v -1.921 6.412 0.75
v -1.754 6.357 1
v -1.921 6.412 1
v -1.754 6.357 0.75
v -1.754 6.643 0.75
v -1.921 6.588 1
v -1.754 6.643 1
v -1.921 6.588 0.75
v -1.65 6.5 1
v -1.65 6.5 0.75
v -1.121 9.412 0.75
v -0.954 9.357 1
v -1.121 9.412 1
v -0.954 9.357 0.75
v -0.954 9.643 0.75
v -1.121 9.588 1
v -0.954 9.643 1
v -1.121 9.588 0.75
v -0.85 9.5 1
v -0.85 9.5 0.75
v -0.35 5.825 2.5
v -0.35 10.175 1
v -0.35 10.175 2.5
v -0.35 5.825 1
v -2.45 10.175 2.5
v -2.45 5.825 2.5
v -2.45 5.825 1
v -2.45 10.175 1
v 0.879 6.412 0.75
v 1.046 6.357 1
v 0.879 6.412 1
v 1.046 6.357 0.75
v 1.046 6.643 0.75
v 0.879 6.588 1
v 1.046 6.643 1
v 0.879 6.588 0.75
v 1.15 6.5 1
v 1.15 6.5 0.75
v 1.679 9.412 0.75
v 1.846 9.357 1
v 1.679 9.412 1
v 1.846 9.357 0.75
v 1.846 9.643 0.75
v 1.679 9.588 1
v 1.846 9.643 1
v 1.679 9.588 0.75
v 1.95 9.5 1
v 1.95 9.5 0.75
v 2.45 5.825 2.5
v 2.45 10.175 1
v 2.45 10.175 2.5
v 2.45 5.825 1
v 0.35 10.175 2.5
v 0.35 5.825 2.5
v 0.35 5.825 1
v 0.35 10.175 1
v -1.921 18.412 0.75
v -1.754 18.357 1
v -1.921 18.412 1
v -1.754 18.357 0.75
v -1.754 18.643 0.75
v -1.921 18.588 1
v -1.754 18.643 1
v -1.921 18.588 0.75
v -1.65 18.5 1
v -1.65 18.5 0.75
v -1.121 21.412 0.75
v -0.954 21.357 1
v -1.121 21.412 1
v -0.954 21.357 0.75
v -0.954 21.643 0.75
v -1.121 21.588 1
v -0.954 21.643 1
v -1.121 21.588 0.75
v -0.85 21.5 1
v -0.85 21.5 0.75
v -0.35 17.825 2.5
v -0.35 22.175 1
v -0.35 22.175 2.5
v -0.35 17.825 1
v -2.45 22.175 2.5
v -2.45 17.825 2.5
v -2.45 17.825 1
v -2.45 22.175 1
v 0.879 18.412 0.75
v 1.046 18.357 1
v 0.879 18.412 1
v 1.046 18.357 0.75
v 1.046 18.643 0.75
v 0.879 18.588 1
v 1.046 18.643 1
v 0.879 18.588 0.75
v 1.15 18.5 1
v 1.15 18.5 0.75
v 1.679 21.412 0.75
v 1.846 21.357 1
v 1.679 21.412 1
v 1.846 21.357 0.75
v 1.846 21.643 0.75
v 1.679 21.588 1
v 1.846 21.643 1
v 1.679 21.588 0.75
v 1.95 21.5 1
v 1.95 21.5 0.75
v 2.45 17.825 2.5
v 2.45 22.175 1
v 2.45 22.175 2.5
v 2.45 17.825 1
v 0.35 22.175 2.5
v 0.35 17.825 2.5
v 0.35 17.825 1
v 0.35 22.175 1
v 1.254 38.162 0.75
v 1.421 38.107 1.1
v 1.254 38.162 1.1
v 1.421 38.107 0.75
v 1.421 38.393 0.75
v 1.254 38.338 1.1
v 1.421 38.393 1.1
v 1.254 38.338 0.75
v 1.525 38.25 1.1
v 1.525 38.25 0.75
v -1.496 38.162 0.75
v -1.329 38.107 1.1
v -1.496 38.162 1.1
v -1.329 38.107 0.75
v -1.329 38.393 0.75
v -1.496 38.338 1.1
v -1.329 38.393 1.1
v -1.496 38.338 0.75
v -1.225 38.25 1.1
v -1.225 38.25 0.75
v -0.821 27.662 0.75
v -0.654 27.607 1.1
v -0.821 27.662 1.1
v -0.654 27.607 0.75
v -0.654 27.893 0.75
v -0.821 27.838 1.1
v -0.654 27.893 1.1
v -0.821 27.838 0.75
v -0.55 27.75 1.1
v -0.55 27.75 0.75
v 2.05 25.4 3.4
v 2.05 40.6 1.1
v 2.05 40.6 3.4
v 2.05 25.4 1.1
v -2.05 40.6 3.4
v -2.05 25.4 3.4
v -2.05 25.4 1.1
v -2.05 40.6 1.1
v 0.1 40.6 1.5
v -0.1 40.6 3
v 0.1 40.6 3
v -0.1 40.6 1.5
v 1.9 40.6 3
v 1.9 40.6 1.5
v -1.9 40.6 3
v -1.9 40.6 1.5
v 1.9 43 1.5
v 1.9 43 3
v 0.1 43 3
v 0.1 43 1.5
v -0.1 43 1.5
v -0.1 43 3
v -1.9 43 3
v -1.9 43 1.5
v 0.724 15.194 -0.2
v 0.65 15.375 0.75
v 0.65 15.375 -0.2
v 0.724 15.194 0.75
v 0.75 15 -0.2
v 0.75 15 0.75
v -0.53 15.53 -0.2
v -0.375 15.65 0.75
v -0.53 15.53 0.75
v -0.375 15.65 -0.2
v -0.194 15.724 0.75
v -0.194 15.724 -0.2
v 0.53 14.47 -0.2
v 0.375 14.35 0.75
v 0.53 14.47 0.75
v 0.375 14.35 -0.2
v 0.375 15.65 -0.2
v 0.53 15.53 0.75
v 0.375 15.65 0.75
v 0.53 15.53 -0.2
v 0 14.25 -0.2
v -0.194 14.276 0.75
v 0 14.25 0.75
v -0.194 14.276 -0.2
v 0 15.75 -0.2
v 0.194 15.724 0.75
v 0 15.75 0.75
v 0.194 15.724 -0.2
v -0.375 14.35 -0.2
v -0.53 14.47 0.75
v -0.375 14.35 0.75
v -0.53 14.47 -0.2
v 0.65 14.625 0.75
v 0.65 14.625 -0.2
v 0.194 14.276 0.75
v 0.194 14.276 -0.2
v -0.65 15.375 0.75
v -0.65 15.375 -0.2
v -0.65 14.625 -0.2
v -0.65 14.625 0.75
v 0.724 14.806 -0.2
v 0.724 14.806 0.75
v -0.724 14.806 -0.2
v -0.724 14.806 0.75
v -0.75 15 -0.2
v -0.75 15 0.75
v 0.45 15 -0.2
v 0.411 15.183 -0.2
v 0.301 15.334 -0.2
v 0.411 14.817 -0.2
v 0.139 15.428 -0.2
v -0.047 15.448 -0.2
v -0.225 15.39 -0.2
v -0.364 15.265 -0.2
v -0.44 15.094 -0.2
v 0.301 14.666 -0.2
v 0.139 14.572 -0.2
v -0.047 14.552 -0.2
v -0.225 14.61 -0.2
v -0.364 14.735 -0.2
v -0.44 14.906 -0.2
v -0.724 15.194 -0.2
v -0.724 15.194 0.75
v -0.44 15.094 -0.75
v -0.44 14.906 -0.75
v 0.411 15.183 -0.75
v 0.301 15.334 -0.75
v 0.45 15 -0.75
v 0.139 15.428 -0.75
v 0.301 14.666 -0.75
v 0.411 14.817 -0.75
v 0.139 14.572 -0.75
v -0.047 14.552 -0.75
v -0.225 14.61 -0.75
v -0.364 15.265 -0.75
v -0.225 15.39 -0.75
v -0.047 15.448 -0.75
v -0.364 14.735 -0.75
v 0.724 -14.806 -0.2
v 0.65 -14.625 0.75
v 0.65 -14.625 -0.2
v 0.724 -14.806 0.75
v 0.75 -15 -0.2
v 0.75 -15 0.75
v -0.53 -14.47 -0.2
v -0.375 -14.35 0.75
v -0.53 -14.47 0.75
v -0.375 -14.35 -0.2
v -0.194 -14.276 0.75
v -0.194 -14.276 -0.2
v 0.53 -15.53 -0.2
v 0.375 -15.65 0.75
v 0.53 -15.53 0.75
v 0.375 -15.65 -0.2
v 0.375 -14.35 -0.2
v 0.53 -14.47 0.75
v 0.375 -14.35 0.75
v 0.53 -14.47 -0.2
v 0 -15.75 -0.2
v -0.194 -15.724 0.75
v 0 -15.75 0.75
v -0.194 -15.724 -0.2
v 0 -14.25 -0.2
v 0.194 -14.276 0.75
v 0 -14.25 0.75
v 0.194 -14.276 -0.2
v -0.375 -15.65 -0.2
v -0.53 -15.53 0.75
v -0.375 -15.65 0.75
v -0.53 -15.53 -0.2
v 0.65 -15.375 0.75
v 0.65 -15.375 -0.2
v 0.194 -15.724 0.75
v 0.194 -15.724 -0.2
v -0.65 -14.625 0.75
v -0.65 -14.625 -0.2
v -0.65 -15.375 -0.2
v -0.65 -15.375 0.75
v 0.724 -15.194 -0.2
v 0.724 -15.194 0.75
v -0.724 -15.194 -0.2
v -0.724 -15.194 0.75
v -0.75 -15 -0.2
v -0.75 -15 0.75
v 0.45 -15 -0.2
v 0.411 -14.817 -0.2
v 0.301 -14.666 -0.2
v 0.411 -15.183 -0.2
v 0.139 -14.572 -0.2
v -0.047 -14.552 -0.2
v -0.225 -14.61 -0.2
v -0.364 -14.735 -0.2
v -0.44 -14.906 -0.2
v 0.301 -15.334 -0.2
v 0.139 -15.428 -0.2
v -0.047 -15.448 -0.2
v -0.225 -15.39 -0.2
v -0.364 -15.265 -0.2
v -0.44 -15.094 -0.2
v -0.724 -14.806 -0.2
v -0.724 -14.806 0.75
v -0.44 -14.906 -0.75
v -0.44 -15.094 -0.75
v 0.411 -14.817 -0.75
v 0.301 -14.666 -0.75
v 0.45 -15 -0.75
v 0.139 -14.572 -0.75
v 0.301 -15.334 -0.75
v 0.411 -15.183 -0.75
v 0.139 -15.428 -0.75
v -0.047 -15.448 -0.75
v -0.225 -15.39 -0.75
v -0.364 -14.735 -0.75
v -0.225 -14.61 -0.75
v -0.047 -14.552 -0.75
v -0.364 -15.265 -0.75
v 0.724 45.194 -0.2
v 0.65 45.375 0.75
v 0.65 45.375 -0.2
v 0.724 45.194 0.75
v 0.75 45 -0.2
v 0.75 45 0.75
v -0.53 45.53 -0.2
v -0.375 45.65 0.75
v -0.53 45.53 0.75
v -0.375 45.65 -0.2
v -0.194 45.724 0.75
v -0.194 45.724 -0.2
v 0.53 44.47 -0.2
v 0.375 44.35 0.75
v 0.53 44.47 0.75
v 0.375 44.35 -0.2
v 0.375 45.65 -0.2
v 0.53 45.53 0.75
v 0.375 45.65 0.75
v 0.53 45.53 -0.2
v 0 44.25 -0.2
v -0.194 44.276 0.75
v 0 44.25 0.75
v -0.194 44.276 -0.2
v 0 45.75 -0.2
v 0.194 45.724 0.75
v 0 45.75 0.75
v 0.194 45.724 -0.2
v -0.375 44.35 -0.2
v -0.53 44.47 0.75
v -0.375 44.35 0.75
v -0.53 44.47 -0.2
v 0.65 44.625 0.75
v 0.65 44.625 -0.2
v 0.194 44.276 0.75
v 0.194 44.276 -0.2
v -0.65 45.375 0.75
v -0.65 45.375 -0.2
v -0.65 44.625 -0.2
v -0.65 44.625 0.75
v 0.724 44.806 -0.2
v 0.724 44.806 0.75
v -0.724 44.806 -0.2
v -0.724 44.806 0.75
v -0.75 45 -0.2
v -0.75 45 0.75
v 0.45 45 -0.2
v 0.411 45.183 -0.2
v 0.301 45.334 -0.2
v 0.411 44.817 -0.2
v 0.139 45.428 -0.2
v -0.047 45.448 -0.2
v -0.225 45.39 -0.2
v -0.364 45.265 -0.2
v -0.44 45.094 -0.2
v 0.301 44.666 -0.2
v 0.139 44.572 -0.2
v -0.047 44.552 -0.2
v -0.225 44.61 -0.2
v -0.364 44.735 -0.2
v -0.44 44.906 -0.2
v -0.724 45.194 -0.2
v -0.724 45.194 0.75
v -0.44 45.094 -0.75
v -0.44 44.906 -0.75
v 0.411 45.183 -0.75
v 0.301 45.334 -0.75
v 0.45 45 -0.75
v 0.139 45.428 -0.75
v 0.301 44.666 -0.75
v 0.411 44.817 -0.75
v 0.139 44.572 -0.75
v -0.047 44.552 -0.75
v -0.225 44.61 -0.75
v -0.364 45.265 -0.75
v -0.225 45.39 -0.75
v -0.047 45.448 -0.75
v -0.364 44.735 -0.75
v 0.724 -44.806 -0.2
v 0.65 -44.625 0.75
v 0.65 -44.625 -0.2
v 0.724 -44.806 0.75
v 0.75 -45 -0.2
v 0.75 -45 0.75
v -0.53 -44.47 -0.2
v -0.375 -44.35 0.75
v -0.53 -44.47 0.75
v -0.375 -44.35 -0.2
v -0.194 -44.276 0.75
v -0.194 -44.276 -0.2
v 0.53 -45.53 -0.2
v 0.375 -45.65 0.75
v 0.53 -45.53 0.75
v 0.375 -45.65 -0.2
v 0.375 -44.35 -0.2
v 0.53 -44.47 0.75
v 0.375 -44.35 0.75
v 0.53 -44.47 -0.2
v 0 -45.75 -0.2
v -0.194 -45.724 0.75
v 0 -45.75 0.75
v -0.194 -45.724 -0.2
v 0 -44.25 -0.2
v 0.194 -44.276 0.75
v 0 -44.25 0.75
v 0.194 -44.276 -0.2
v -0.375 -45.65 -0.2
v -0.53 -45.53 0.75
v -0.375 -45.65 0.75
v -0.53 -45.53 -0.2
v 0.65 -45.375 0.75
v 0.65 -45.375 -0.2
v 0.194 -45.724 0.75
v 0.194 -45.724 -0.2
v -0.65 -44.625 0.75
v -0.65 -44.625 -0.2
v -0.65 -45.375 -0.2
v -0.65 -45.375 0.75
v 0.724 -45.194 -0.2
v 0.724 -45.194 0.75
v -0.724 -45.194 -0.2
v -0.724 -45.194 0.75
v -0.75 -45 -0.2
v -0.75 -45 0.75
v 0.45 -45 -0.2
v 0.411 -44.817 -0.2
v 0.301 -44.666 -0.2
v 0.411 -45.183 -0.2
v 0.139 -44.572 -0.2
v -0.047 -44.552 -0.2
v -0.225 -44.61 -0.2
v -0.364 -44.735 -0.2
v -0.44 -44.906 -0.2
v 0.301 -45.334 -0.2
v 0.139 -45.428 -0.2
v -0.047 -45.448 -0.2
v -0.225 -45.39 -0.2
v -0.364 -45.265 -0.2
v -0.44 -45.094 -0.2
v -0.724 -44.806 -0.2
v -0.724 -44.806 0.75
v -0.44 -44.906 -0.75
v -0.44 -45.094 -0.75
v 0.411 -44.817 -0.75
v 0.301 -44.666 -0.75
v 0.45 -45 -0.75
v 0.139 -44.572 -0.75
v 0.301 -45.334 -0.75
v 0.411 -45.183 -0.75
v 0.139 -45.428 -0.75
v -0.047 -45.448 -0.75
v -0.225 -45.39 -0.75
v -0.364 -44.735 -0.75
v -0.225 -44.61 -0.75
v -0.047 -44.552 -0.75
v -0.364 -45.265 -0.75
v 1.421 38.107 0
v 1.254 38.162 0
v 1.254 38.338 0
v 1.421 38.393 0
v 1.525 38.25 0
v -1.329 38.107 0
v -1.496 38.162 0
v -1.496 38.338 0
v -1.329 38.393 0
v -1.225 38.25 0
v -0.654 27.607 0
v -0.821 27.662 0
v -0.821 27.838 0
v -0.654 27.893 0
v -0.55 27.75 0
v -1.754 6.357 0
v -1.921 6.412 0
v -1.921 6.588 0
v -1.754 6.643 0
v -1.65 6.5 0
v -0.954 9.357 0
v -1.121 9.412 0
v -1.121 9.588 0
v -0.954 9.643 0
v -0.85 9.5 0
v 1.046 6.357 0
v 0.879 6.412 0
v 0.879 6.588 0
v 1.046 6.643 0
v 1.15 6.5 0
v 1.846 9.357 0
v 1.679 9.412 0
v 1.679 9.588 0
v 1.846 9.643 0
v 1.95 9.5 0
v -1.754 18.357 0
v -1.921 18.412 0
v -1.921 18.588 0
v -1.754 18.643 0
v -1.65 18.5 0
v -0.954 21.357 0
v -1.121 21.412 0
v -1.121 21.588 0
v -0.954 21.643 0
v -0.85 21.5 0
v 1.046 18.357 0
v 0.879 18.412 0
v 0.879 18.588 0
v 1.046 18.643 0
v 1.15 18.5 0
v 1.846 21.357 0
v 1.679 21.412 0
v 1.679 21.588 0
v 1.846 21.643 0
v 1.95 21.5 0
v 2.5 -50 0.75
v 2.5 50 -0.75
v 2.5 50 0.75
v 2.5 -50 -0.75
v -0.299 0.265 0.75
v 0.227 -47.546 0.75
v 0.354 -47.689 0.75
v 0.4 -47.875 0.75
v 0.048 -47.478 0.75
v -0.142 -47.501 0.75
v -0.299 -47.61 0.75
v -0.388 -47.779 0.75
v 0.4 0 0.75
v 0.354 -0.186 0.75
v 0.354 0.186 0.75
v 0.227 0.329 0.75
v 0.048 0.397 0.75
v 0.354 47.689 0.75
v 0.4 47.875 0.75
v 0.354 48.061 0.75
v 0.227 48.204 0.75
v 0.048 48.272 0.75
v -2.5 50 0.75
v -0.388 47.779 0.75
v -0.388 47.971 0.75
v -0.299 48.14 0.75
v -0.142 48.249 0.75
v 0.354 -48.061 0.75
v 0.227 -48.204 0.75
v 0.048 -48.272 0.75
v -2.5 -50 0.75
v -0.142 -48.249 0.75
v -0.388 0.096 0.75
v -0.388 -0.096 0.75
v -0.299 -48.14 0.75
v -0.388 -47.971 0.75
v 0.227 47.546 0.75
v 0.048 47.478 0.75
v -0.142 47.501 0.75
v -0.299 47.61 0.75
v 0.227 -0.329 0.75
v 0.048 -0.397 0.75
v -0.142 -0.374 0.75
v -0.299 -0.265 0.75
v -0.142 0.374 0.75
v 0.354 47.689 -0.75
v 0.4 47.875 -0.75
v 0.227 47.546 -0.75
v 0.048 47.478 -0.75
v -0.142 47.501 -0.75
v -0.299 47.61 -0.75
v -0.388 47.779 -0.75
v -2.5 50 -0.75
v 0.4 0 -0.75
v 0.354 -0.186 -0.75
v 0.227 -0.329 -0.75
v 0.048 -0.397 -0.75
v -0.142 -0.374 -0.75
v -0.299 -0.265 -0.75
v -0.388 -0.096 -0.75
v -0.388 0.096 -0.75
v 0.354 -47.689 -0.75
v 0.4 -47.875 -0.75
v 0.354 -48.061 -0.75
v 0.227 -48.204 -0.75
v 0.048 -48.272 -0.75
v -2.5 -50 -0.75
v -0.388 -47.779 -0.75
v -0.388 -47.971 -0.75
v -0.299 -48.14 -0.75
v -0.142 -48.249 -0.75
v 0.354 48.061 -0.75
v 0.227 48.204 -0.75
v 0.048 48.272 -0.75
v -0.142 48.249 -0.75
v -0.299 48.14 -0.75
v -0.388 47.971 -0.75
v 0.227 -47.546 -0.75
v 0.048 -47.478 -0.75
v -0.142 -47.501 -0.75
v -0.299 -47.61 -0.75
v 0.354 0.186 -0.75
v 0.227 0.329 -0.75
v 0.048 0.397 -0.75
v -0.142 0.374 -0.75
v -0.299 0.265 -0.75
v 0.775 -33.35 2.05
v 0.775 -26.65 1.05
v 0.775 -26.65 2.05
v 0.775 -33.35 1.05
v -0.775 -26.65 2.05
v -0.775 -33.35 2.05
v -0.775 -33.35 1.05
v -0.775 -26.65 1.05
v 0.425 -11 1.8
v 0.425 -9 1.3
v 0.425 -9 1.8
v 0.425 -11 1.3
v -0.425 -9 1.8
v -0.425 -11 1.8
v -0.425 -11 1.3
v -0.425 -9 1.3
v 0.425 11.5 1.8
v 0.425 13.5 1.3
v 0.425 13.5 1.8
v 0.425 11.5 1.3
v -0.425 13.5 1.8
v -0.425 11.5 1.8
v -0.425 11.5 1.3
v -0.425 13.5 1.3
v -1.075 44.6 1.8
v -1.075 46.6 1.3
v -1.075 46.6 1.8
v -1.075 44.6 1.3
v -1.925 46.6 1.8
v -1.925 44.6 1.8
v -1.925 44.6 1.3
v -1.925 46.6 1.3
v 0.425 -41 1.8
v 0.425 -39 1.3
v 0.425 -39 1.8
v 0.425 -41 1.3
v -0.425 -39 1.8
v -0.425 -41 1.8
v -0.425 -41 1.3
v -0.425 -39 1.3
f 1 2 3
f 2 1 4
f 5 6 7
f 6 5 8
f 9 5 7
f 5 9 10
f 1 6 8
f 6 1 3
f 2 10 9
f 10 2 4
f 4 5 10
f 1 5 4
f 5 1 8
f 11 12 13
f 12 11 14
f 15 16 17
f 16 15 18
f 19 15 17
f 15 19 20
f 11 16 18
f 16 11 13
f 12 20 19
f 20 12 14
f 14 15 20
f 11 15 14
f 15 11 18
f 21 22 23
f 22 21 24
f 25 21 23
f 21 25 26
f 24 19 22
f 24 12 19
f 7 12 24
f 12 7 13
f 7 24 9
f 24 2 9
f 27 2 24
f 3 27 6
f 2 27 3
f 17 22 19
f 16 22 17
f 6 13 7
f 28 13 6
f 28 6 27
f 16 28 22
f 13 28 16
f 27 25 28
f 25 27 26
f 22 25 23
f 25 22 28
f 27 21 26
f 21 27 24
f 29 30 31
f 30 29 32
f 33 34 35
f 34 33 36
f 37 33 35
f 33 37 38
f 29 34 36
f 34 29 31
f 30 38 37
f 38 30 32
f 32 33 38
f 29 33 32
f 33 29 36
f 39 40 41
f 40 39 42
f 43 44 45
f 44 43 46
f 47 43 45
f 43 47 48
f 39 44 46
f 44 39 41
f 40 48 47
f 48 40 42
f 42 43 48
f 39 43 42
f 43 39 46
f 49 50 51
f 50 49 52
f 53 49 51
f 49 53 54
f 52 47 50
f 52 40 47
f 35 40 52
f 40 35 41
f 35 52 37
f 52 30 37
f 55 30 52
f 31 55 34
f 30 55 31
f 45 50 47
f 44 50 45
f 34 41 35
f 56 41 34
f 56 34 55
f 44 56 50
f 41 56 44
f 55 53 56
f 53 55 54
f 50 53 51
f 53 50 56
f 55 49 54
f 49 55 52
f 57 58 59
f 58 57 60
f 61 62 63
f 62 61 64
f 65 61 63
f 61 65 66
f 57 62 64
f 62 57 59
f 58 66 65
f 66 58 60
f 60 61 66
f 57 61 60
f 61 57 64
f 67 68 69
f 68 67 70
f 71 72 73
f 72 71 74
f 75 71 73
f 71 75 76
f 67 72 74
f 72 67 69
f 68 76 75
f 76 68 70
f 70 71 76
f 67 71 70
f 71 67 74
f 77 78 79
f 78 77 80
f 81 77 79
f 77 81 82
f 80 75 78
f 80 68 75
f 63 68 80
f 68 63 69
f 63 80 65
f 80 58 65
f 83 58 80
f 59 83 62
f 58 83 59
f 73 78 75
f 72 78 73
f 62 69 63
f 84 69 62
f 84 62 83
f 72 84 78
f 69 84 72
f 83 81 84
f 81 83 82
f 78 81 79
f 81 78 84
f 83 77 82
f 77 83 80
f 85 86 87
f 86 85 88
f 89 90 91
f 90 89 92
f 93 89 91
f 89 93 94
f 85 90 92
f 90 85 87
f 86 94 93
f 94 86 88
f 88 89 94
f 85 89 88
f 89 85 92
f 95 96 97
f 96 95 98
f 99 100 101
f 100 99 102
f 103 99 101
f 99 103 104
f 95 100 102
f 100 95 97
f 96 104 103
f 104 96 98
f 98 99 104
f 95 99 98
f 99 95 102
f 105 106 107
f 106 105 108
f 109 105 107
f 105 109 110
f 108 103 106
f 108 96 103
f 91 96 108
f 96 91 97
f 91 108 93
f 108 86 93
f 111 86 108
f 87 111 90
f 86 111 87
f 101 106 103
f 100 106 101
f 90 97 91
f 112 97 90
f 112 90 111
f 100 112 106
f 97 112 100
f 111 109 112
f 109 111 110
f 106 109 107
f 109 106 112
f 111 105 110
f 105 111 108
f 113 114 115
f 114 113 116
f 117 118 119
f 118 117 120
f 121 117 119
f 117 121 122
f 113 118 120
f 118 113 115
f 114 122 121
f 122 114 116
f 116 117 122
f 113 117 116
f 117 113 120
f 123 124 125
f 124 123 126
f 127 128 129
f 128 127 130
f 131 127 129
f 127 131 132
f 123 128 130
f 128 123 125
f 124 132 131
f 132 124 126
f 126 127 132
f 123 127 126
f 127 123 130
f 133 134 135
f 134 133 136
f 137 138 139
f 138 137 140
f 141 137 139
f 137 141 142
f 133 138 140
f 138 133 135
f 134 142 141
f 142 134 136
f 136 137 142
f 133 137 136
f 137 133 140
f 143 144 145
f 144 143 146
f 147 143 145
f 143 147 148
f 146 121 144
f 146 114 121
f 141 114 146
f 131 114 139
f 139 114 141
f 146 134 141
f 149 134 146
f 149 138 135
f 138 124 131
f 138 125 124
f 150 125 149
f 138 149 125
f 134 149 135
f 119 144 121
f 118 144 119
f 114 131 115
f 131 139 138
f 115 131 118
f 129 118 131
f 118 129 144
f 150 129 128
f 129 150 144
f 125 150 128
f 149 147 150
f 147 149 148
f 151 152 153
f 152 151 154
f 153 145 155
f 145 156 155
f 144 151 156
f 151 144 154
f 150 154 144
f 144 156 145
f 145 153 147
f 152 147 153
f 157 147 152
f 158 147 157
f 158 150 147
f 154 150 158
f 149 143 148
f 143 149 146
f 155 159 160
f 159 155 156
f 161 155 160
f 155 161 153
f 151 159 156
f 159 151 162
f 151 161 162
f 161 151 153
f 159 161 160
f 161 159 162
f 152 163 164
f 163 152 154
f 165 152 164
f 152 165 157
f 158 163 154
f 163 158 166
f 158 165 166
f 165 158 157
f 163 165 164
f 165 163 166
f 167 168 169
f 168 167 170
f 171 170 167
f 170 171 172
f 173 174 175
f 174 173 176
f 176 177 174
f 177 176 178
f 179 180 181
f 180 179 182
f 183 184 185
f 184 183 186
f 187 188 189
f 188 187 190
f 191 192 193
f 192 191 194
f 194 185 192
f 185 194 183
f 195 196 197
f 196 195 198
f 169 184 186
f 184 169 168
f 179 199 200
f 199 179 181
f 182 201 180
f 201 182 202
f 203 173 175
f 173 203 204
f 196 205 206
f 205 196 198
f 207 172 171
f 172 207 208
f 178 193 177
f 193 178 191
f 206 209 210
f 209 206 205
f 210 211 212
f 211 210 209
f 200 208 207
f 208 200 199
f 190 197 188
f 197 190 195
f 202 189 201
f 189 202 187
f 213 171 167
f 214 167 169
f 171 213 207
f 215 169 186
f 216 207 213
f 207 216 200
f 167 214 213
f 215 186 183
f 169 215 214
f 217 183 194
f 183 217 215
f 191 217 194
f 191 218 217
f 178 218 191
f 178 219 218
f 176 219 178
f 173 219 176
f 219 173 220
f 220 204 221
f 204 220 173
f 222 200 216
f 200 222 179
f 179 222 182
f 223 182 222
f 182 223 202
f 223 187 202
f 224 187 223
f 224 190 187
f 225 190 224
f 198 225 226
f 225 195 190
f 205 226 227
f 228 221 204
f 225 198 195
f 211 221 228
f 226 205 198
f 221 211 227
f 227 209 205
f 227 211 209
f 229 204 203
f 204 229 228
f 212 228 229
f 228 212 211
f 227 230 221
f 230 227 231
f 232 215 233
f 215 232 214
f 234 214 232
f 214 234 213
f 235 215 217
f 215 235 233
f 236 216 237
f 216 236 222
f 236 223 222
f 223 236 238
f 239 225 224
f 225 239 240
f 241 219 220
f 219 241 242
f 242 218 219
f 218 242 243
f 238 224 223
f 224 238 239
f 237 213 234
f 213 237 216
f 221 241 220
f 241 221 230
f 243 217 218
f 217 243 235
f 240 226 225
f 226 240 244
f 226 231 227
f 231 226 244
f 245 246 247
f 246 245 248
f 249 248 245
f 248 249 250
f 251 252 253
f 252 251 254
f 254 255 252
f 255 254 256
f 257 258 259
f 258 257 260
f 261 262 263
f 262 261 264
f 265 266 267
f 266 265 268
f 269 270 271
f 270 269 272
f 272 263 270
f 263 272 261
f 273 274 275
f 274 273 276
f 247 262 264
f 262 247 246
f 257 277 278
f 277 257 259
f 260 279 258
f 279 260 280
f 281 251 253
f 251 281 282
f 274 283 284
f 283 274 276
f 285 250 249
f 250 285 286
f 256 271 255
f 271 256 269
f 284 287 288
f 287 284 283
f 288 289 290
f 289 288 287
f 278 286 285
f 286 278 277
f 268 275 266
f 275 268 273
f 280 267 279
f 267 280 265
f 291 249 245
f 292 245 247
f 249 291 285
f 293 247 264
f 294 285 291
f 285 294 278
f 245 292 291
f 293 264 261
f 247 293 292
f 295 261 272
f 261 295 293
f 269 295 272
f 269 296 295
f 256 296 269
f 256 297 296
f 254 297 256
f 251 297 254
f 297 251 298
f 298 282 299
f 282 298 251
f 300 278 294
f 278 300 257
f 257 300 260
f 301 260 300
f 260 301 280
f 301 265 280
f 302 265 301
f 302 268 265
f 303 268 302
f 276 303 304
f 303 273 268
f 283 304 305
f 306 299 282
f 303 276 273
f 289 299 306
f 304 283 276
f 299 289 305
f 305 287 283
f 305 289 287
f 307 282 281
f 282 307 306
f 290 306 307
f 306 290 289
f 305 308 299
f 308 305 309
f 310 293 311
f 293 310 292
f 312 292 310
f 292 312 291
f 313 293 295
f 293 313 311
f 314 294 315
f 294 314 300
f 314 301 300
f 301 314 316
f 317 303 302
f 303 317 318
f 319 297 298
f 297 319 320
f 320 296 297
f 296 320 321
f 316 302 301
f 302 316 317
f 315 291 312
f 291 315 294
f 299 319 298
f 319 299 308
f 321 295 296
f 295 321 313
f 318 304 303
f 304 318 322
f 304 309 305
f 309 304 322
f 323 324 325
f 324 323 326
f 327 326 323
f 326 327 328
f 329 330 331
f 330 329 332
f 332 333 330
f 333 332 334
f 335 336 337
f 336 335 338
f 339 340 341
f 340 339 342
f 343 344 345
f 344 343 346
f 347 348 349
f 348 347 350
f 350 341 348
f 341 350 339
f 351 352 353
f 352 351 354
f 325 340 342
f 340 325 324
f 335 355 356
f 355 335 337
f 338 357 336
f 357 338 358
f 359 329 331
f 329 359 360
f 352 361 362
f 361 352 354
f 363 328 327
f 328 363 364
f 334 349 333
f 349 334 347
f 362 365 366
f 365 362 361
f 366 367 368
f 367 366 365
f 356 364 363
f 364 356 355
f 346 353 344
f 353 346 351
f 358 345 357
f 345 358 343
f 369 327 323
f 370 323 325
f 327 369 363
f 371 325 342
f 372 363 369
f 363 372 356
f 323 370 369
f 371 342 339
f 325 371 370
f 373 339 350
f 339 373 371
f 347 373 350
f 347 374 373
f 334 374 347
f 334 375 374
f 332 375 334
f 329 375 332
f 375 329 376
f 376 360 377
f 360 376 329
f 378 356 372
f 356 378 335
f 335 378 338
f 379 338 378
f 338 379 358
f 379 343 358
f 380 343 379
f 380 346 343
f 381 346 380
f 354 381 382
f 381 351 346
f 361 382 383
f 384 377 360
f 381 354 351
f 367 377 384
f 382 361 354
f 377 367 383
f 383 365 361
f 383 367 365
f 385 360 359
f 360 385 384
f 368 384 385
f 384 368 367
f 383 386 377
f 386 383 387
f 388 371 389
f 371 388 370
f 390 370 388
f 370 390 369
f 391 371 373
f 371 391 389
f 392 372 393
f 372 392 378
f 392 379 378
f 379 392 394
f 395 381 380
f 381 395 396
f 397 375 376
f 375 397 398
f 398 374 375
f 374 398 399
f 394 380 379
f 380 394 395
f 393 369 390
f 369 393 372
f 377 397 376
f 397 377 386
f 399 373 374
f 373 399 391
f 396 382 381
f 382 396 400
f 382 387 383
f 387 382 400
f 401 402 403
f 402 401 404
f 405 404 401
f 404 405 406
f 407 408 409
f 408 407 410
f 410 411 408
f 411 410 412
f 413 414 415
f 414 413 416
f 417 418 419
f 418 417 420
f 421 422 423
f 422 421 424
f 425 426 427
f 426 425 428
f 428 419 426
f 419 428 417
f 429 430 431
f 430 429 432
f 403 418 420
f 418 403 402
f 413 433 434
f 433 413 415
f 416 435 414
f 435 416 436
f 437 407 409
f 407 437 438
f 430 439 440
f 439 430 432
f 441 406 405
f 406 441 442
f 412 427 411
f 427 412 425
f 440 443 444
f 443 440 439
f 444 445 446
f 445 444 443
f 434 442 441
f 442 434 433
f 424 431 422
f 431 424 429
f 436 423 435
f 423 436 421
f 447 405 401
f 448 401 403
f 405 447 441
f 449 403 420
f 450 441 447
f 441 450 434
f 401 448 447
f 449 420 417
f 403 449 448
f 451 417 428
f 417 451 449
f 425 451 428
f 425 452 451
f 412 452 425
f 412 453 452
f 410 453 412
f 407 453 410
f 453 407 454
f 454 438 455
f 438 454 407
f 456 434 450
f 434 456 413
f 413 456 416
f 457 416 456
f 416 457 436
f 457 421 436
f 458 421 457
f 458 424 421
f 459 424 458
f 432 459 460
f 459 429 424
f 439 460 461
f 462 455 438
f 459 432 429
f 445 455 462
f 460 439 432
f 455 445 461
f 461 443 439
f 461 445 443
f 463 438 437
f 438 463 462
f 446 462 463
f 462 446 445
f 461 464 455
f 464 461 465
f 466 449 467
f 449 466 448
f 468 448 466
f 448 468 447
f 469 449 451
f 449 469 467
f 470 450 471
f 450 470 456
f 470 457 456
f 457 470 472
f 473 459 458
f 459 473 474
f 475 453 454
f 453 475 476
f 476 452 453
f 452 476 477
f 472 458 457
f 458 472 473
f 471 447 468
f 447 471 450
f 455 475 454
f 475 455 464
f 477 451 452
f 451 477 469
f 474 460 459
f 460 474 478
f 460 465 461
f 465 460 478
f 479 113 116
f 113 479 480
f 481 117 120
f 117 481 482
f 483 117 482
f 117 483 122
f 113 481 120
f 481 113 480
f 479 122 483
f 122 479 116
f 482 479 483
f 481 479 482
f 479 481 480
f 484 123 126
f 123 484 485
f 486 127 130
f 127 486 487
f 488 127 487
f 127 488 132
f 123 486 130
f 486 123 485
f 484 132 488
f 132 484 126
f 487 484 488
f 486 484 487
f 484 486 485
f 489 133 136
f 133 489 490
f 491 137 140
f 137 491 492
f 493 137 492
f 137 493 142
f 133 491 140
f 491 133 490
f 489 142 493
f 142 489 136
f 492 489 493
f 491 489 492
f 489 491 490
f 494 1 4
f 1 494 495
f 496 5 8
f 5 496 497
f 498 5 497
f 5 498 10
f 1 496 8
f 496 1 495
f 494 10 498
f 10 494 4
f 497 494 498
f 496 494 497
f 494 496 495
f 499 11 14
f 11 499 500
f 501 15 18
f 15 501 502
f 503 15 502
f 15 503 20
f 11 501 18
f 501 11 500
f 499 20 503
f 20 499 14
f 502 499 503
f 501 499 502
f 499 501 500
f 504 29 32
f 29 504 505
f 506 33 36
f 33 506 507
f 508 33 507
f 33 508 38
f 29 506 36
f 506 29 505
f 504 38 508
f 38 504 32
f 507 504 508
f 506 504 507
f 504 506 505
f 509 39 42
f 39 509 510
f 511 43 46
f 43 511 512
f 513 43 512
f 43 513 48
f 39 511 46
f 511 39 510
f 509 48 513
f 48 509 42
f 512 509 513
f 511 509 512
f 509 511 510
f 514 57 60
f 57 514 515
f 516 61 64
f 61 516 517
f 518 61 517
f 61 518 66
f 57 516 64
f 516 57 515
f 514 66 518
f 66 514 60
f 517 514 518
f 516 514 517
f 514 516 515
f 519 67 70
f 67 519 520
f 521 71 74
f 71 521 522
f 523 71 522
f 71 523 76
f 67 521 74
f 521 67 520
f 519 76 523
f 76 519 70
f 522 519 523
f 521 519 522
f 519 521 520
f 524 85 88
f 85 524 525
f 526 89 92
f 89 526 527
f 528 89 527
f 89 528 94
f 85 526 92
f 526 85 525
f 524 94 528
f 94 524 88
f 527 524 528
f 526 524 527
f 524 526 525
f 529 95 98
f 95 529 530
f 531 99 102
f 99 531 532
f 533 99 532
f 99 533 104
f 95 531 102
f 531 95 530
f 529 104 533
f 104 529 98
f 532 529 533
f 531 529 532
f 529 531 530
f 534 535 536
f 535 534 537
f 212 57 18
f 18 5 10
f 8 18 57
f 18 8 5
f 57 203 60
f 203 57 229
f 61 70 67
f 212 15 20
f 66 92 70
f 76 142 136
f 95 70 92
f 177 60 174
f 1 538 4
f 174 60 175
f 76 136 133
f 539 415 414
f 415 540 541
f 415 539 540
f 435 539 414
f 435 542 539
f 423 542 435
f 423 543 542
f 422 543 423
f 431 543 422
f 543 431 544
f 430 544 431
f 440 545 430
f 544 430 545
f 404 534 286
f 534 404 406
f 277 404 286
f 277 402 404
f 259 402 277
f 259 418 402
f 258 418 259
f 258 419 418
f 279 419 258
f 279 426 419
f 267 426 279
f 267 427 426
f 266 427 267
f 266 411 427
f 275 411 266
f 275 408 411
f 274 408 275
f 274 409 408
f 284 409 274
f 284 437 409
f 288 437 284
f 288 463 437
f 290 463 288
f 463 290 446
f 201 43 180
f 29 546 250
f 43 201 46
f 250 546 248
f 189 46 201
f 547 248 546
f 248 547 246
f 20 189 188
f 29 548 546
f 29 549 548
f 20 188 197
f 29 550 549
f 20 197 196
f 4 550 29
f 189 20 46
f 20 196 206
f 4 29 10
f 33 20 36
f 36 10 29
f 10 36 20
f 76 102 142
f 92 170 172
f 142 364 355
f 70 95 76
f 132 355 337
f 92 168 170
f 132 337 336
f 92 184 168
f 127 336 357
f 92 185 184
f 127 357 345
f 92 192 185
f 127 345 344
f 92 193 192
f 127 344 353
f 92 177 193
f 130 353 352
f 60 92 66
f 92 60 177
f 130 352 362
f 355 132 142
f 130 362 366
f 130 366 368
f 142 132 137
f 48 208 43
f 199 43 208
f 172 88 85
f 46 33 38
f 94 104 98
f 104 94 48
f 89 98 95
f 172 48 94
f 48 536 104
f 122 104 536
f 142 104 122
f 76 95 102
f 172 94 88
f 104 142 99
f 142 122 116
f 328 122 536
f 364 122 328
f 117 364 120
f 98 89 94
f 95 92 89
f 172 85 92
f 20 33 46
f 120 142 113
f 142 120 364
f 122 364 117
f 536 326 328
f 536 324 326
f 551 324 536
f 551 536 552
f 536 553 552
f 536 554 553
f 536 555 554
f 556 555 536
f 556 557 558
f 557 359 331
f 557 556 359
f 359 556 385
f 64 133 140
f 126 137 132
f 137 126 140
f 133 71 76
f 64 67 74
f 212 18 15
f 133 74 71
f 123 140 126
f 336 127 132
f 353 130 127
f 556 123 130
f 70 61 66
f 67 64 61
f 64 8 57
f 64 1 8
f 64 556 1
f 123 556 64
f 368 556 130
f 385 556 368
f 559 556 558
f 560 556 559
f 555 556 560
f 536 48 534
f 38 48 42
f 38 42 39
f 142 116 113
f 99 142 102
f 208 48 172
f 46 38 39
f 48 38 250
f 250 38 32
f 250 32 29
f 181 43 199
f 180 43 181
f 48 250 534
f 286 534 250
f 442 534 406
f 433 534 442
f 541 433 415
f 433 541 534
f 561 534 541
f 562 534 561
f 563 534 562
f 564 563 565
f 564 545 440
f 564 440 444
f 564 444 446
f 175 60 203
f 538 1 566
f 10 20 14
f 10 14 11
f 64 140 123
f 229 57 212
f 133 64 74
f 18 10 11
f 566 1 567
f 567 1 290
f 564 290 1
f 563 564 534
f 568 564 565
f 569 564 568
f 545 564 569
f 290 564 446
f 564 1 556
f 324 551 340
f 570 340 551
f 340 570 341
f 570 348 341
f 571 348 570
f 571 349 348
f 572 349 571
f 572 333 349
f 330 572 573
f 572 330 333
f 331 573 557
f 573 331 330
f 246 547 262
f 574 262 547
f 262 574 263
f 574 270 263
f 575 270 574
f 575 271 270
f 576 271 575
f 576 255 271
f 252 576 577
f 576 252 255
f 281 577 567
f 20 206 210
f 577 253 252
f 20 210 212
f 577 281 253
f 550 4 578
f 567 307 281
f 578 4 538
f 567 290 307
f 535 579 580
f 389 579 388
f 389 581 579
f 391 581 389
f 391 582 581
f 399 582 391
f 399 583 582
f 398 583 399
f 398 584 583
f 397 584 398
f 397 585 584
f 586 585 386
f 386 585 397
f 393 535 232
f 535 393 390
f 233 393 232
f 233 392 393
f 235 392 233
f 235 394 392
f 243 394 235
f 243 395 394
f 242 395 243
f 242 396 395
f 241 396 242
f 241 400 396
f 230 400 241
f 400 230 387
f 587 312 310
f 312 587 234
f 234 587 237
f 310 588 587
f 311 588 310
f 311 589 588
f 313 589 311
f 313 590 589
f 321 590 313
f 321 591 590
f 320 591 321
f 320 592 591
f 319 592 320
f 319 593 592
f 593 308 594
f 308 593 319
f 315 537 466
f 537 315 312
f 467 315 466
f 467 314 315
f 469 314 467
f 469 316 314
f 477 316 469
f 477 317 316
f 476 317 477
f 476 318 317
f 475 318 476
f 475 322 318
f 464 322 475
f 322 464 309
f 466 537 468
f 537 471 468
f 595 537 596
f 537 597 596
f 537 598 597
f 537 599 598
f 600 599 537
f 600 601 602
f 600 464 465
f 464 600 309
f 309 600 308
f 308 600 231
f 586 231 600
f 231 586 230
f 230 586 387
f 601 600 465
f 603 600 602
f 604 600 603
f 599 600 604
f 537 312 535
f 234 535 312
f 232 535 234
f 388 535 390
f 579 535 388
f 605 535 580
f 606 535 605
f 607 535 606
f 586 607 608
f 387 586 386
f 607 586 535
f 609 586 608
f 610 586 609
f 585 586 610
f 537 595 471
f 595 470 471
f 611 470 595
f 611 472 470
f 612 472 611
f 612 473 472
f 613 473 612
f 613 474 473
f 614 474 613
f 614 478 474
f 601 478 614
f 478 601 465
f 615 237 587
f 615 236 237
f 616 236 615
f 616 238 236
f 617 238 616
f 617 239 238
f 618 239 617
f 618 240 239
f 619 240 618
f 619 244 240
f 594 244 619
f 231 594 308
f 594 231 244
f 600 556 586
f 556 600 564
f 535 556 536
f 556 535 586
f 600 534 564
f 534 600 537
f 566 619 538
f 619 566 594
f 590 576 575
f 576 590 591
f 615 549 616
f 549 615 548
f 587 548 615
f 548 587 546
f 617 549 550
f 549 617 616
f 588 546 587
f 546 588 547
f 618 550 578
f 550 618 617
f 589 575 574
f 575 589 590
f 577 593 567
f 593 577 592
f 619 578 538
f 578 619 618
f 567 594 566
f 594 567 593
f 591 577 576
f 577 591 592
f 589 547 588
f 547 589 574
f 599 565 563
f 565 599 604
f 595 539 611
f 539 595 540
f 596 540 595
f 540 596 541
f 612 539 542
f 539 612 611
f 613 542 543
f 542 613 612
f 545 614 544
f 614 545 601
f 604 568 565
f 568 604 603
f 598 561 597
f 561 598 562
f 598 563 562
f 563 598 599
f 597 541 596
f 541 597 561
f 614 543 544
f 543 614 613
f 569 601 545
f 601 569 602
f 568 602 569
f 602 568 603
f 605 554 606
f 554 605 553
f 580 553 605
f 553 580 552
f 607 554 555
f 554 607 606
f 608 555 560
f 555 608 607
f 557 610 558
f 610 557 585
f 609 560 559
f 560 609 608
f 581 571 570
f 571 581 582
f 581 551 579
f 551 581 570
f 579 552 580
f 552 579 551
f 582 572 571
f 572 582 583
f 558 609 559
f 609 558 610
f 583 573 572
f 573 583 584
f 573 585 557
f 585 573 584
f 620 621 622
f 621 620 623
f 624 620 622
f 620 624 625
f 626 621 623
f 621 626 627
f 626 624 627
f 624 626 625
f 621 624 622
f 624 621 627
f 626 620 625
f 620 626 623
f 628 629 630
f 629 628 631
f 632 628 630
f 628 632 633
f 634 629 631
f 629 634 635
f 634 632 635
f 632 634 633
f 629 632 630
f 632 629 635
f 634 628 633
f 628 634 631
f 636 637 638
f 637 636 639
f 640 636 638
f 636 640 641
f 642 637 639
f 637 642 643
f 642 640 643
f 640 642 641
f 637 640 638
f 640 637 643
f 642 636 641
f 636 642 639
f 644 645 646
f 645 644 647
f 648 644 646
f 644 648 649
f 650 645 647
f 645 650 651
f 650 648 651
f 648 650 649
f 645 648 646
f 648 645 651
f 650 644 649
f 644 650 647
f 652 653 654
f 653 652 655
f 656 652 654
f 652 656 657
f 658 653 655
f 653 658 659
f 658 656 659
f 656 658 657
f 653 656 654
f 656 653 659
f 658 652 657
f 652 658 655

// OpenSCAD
module laser_module() {
    translate([0, 0, -0.2])
        cylinder(h=1.2, r=0.75);
    translate([0, 0, -2 + 0.01])
        cylinder(h=2, r=0.45);
}

module locking_module() {
    translate([0, 0, -1.1])
        cylinder(h=2.2, r=0.4);
}

module bucket_module() {
    translate([-0.4, -1.5, 0])
    color([0.5, 0.5, 0.5])
        cylinder(h=1, r=0.15);
    translate([0.4, 1.5, 0])
    color([0.5, 0.5, 0.5])
        cylinder(h=1, r=0.15);
}

module dmx_driver_module() {
    translate([1.375, 5.25, 0])
    color([0.5, 0.5, 0.5])
        cylinder(h=1, r=0.15);
    translate([-1.375, 5.25, 0])
    color([0.5, 0.5, 0.5])
        cylinder(h=1, r=0.15);
    translate([-0.7, -5.25, 0])
    color([0.5, 0.5, 0.5])
        cylinder(h=1, r=0.15);
}

module bucket_converter() {
    translate([0, 0, 1])
    color([0, 0, 1])
        cube([2.1, 4.35, 1.5], center=true);
    bucket_module();
}

module dmx_driver() {
    translate([0, 0, 1.5])
    color([0.2, 0.2, 0.2])
        cube([4.1, 15.2, 2.3], center=true);
    translate([1, 7.6, 1.5])
    color([0.8, 0.8, 0])
        cube([1.8, 4.8, 1.5], center=true);
    translate([-1, 7.6, 1.5])
    color([0.8, 0.8, 0])
        cube([1.8, 4.8, 1.5], center=true);
    dmx_driver_module();
}

module antenna_circuit() {
    translate([0, 0, 0.8])
    color([0, 0.6, 0.6])
        cube([1.55, 6.7, 1], center=true);
}

module laser_drive() {
    translate([0, 0, 0.8])
    color([0, 0.7, 0.3])
        cube([0.85, 2, 0.5], center=true);
}

$fa = 2;
$fs = 0.2;

translate([-1.4, 8, 0.75]) bucket_converter();
translate([+1.4, 8, 0.75]) bucket_converter();
translate([-1.4, 20, 0.75]) bucket_converter();
translate([+1.4, 20, 0.75]) bucket_converter();

translate([0, 33, 0.75]) dmx_driver();

translate([0, -30, 0.75]) antenna_circuit();

translate([0, -10, 0.75]) laser_drive();
translate([0, +12.5, 0.75]) laser_drive();
translate([-1.5, +45.6, 0.75]) laser_drive();
translate([0, -40, 0.75]) laser_drive();

difference() {
    cube([5, 100, 1.5], center=true);

    locking_module();
    translate([0, -47.875, 0]) locking_module();
    translate([0, +47.875, 0]) locking_module();
    
    translate([0, +15, 0]) laser_module();
    translate([0, -15, 0]) laser_module();
    translate([0, +45, 0]) laser_module();
    translate([0, -45, 0]) laser_module();

    translate([0, 33, 0]) dmx_driver_module();
    
    translate([-1.4, 8, 0]) bucket_module();
    translate([+1.4, 8, 0]) bucket_module();
    translate([-1.4, 20, 0]) bucket_module();
    translate([+1.4, 20, 0]) bucket_module();
}
